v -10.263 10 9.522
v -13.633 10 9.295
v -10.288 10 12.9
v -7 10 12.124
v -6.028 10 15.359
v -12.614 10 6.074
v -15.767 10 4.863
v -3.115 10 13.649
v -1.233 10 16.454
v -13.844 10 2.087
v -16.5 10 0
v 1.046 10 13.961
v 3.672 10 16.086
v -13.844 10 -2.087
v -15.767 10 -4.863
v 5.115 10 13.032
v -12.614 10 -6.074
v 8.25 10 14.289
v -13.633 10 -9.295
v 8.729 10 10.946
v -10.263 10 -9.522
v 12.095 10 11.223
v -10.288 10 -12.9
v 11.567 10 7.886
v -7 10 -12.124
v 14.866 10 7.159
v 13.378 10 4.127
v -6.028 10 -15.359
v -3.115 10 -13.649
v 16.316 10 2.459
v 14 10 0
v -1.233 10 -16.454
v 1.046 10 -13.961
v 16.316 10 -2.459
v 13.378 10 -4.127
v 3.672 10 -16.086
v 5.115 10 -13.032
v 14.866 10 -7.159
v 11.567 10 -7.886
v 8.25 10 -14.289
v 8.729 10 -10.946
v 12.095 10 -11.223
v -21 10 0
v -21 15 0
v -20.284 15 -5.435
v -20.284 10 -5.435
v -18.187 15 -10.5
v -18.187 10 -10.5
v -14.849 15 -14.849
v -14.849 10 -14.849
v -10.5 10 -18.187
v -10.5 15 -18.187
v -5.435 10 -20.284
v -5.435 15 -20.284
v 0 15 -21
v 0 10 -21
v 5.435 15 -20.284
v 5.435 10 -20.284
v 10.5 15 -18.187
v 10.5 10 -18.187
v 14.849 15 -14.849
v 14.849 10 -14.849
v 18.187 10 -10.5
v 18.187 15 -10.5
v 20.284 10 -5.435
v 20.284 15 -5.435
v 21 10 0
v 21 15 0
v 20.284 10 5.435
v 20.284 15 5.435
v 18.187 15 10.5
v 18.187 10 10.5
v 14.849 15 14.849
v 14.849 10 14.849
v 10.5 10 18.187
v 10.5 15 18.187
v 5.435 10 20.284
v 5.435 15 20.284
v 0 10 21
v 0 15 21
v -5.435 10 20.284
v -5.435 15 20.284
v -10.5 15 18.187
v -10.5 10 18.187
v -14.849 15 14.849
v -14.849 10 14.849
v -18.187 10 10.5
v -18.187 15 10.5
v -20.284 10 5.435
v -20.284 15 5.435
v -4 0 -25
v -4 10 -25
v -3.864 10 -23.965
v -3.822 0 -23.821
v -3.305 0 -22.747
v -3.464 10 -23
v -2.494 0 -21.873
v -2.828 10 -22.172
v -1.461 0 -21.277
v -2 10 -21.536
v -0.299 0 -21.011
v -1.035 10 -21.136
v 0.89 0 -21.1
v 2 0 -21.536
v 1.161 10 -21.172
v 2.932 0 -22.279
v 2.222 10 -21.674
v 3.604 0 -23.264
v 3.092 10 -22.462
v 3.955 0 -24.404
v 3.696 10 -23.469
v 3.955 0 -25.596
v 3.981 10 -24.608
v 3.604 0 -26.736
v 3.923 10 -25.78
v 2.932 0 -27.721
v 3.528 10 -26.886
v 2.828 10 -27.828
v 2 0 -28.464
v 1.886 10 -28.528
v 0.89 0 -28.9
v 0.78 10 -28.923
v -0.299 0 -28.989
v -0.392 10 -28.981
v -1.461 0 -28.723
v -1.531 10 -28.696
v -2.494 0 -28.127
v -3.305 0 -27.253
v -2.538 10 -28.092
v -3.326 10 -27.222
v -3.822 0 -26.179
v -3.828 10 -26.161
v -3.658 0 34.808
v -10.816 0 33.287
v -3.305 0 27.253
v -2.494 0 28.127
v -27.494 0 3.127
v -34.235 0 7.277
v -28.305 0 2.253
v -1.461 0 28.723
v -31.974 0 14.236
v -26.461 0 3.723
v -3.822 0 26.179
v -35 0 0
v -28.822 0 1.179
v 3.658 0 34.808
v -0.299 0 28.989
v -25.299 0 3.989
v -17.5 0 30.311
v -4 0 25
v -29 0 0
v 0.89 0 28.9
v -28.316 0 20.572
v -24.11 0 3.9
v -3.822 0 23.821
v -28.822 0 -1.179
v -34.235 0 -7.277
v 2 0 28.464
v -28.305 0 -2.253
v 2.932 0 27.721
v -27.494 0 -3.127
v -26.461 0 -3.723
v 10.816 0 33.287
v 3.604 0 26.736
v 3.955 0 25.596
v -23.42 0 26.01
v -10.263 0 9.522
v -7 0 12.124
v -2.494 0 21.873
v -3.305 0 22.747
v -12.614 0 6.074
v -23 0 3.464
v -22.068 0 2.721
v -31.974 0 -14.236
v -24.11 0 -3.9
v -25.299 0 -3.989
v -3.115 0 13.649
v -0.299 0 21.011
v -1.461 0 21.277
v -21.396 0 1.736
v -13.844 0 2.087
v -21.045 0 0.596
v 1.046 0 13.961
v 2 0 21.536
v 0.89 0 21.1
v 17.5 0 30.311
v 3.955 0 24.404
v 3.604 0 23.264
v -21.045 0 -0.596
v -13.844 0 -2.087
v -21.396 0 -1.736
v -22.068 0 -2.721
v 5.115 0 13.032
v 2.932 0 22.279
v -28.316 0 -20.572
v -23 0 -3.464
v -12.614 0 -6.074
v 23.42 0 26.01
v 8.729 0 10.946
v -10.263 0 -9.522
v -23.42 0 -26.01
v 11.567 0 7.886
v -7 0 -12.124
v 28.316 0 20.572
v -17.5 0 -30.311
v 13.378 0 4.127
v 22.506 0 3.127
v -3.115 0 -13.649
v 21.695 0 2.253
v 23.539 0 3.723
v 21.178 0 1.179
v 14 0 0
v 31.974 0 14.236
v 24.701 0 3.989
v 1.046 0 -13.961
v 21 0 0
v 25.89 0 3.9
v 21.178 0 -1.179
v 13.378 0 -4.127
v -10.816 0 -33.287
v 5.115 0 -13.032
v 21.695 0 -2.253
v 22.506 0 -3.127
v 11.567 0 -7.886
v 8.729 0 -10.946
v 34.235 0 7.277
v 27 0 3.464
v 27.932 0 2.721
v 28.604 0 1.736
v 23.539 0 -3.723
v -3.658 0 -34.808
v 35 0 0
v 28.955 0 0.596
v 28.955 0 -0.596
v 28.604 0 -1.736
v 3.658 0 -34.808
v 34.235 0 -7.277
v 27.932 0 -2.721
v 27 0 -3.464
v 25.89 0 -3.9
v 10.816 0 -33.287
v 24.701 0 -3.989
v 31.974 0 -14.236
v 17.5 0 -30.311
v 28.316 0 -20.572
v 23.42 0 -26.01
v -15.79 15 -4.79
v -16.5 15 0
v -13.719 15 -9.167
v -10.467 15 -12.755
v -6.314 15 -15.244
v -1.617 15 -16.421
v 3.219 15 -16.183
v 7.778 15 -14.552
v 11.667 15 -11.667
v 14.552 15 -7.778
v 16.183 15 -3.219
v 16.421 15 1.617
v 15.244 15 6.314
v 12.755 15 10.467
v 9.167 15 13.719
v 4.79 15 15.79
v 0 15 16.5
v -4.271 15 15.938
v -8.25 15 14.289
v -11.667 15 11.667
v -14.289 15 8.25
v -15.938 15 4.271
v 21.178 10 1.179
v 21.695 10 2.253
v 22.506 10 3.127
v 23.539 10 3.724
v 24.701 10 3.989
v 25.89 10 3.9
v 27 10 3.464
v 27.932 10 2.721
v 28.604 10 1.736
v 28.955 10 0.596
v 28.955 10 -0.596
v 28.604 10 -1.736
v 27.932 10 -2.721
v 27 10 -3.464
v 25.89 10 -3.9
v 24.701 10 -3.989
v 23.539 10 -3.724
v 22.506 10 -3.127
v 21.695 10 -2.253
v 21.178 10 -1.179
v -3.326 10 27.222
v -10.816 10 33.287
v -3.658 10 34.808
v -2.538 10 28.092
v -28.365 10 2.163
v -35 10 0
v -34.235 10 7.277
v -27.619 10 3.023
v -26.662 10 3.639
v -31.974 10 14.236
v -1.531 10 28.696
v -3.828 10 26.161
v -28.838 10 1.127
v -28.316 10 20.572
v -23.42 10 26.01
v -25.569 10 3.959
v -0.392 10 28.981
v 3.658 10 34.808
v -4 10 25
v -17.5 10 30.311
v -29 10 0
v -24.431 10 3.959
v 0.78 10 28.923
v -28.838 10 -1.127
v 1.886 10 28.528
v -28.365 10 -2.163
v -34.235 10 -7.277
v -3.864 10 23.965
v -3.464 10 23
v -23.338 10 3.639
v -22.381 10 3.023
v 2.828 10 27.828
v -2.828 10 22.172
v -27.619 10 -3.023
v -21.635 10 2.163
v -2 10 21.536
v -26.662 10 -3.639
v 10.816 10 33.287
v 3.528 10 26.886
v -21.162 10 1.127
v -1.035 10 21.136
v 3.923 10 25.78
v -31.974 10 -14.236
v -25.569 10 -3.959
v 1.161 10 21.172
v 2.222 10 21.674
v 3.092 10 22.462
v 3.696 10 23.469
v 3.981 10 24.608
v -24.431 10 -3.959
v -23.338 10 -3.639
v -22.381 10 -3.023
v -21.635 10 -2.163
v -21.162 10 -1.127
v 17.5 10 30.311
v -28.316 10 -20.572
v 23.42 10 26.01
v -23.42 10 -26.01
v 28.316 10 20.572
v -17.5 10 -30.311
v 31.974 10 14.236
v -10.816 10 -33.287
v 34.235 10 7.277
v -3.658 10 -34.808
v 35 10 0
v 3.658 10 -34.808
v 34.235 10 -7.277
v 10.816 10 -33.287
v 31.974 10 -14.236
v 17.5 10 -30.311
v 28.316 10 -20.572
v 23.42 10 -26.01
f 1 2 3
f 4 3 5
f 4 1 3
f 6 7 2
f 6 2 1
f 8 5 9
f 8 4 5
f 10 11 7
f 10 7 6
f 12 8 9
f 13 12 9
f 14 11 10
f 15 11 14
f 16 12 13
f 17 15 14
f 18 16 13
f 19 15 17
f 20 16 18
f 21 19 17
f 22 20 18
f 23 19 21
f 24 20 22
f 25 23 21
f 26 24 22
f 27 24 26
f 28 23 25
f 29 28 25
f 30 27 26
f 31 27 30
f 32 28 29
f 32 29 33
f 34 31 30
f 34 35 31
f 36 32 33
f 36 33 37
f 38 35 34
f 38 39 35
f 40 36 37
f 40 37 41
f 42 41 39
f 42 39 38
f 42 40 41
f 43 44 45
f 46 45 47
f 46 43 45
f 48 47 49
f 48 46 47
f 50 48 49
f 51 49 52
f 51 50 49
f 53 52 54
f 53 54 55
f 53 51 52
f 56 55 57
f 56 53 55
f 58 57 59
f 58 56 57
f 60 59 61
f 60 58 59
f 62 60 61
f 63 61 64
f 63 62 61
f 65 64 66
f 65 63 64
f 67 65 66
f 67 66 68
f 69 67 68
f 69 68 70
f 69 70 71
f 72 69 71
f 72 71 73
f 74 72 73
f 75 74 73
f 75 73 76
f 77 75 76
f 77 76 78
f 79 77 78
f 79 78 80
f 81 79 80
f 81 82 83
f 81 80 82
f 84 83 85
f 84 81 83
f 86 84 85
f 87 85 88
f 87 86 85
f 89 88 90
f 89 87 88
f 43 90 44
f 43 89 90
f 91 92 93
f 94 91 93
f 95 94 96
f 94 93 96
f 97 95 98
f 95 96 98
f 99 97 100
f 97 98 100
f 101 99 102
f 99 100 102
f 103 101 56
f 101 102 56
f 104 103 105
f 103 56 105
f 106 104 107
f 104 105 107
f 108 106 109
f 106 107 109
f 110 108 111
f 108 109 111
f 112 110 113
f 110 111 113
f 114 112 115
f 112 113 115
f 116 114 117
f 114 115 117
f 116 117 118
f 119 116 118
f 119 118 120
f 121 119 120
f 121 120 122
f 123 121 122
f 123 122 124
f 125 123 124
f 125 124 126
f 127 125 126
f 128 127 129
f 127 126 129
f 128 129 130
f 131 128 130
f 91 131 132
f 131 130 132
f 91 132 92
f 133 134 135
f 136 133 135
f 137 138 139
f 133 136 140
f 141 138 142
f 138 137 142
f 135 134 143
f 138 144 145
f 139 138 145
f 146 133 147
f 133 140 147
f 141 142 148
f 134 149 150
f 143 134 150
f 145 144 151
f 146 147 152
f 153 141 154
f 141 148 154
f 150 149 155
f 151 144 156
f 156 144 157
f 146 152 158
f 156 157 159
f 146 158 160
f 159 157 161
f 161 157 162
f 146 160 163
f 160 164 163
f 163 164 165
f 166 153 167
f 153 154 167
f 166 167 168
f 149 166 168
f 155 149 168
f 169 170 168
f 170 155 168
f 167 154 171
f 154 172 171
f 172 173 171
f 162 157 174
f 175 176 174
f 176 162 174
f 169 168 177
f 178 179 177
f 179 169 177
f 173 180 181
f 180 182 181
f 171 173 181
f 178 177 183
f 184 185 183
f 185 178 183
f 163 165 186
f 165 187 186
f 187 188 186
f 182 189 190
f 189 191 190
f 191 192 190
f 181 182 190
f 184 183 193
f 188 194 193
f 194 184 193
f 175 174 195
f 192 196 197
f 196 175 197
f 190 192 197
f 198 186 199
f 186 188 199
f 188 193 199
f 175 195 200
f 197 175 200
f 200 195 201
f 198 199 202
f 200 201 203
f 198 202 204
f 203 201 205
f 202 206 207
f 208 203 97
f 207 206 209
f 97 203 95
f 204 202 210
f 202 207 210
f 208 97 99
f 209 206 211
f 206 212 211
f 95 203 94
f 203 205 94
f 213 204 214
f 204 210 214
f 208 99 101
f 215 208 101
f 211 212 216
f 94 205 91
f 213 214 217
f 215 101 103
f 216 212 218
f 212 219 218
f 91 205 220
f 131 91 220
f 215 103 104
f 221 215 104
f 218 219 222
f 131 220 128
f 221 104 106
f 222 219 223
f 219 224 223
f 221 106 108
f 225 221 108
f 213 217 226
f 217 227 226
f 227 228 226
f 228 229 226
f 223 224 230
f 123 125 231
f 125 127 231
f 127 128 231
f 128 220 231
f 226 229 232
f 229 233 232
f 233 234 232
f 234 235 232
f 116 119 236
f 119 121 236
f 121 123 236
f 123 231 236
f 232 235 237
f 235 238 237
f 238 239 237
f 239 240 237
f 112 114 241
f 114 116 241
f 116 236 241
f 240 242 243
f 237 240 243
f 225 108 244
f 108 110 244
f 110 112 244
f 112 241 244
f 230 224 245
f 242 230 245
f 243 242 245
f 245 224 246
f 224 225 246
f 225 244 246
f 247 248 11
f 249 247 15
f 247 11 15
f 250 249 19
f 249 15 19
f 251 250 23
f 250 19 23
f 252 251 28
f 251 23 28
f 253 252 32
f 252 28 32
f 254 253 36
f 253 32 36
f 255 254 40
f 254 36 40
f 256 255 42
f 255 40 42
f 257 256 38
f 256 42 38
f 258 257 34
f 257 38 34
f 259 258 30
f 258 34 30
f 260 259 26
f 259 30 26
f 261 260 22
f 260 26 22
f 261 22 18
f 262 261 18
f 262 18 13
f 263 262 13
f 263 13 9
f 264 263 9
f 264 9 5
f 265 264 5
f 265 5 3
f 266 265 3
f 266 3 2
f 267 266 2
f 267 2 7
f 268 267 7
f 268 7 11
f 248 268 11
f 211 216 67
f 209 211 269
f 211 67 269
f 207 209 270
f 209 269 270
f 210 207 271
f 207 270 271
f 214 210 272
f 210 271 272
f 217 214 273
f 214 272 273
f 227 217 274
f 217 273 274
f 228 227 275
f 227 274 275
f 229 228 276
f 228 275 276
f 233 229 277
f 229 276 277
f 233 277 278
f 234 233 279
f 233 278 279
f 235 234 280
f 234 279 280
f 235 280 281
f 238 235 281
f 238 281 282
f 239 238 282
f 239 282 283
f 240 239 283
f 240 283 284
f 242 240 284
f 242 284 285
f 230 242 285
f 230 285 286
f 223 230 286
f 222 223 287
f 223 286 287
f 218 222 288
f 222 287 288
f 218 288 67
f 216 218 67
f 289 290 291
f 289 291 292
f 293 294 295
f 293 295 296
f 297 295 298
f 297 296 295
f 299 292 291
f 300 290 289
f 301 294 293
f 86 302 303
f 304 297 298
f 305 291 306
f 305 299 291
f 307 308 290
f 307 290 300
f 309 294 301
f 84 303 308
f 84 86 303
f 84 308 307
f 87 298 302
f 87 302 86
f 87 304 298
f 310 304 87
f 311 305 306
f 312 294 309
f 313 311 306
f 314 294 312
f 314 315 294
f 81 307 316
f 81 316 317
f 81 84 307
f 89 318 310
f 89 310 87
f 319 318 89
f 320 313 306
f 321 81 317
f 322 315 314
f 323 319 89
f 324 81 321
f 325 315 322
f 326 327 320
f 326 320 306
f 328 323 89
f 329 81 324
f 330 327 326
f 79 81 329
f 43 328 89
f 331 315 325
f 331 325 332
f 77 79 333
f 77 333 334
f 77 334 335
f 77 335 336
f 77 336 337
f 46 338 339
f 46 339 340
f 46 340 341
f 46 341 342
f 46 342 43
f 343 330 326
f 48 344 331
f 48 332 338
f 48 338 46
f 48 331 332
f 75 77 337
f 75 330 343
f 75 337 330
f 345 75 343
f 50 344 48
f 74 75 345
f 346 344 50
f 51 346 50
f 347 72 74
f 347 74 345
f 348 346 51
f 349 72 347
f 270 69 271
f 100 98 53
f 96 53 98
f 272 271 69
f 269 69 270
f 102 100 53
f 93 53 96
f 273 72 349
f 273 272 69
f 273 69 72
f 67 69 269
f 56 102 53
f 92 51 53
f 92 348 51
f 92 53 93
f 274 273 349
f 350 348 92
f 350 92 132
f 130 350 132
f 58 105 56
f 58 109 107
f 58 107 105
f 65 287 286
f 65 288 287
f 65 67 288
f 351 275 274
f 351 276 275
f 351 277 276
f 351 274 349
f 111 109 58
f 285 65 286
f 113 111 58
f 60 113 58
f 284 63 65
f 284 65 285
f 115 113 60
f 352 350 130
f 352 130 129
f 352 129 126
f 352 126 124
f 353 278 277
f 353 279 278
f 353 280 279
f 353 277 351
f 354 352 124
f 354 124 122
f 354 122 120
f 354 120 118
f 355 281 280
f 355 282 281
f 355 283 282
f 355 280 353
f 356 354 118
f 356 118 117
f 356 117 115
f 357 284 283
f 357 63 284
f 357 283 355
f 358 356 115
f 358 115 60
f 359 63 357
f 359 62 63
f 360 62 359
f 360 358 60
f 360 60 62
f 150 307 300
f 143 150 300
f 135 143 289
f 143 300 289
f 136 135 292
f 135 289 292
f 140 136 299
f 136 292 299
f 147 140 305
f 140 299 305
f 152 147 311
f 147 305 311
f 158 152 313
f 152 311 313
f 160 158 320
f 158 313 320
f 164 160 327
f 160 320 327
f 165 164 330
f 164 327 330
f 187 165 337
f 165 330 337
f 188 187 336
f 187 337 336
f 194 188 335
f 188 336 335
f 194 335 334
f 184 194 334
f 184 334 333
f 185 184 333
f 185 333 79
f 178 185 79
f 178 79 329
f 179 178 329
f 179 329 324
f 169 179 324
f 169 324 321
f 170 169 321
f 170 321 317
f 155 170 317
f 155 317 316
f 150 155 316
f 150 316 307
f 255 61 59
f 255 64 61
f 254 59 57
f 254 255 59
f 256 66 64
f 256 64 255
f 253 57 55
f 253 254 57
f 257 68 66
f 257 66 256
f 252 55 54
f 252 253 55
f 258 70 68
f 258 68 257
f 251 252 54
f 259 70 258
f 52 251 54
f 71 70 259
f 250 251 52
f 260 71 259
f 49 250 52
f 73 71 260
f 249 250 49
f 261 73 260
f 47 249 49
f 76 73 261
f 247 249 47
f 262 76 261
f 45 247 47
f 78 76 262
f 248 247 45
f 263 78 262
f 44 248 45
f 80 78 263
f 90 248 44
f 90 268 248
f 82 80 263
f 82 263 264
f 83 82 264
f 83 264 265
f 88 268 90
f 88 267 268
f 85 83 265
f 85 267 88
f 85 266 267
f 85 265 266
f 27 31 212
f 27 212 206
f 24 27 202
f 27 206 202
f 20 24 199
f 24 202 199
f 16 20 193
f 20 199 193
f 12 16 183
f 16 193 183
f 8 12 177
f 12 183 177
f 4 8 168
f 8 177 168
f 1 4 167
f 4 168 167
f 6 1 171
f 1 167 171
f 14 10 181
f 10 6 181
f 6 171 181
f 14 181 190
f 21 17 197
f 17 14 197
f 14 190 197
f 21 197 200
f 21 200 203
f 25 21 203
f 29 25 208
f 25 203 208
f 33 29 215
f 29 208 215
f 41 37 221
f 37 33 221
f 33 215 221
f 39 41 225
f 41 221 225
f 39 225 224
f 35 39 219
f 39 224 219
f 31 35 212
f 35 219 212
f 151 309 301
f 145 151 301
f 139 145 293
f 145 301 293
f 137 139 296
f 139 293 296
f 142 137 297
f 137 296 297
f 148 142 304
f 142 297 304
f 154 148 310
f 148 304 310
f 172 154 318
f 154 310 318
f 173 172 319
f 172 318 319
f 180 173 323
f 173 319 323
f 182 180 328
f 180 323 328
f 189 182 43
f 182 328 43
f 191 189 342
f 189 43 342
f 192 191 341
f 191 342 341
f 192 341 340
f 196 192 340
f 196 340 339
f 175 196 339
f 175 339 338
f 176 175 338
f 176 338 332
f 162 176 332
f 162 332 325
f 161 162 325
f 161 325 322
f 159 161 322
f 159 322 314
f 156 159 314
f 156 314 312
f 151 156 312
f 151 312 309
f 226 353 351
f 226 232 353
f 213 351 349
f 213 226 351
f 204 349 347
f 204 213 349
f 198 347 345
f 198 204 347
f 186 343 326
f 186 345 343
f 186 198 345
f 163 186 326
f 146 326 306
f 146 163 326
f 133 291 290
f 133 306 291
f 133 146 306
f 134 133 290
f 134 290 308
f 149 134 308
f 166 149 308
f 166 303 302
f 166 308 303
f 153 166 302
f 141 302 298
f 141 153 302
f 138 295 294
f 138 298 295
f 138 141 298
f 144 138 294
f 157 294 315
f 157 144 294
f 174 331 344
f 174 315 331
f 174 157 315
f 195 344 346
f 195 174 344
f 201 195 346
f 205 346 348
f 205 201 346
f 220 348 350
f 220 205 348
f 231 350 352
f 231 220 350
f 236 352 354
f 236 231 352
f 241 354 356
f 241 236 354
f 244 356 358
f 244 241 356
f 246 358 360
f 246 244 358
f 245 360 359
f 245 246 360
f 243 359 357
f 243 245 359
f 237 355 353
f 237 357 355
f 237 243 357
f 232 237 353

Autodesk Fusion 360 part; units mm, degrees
sketch "Sketch1" plane through (0, 0, 0) normal (0, 1, 0) x (1, 0, 0)
  circle A0 centre (0, 0) radius 35
  circle A1 centre (0, 0) radius 14
  dimension "d1" = 70
  dimension "d2" = 28
extrude "Extrude1" add sketch "Sketch1" along normal blind 10
sketch "Sketch2" plane through (0, 10, 0) normal (0, 1, 0) x (-1, 0, 0)
  circle A0 centre (0, 0) radius 14
  circle A1 centre (0, 0) radius 35
  circle A2 centre (0, 0) radius 16.5
  circle A3 centre (0, 0) radius 21
  circle A4 centre (0, 0) radius 25 construction
  circle A5 centre (0, -25) radius 4
  line L0 (0, 0) -> (0, -25) construction
  line L1 (0, 1.75) -> (0, 22.5)
  circle A6 centre (25, 0) radius 4
  circle A7 centre (0, 25) radius 4
  circle A8 centre (-25, 0) radius 4
  dimension "d5" = 33
  dimension "d6" = 42
  dimension "d7" = 50
  dimension "d8" = 8
  dimension "d10" = 360
extrude "Extrude2" add sketch "Sketch2" along normal blind 5 contours A3
extrude "Extrude3" cut sketch "Sketch2" against normal blind 10 contours A7 | A6 | A5 | A8
